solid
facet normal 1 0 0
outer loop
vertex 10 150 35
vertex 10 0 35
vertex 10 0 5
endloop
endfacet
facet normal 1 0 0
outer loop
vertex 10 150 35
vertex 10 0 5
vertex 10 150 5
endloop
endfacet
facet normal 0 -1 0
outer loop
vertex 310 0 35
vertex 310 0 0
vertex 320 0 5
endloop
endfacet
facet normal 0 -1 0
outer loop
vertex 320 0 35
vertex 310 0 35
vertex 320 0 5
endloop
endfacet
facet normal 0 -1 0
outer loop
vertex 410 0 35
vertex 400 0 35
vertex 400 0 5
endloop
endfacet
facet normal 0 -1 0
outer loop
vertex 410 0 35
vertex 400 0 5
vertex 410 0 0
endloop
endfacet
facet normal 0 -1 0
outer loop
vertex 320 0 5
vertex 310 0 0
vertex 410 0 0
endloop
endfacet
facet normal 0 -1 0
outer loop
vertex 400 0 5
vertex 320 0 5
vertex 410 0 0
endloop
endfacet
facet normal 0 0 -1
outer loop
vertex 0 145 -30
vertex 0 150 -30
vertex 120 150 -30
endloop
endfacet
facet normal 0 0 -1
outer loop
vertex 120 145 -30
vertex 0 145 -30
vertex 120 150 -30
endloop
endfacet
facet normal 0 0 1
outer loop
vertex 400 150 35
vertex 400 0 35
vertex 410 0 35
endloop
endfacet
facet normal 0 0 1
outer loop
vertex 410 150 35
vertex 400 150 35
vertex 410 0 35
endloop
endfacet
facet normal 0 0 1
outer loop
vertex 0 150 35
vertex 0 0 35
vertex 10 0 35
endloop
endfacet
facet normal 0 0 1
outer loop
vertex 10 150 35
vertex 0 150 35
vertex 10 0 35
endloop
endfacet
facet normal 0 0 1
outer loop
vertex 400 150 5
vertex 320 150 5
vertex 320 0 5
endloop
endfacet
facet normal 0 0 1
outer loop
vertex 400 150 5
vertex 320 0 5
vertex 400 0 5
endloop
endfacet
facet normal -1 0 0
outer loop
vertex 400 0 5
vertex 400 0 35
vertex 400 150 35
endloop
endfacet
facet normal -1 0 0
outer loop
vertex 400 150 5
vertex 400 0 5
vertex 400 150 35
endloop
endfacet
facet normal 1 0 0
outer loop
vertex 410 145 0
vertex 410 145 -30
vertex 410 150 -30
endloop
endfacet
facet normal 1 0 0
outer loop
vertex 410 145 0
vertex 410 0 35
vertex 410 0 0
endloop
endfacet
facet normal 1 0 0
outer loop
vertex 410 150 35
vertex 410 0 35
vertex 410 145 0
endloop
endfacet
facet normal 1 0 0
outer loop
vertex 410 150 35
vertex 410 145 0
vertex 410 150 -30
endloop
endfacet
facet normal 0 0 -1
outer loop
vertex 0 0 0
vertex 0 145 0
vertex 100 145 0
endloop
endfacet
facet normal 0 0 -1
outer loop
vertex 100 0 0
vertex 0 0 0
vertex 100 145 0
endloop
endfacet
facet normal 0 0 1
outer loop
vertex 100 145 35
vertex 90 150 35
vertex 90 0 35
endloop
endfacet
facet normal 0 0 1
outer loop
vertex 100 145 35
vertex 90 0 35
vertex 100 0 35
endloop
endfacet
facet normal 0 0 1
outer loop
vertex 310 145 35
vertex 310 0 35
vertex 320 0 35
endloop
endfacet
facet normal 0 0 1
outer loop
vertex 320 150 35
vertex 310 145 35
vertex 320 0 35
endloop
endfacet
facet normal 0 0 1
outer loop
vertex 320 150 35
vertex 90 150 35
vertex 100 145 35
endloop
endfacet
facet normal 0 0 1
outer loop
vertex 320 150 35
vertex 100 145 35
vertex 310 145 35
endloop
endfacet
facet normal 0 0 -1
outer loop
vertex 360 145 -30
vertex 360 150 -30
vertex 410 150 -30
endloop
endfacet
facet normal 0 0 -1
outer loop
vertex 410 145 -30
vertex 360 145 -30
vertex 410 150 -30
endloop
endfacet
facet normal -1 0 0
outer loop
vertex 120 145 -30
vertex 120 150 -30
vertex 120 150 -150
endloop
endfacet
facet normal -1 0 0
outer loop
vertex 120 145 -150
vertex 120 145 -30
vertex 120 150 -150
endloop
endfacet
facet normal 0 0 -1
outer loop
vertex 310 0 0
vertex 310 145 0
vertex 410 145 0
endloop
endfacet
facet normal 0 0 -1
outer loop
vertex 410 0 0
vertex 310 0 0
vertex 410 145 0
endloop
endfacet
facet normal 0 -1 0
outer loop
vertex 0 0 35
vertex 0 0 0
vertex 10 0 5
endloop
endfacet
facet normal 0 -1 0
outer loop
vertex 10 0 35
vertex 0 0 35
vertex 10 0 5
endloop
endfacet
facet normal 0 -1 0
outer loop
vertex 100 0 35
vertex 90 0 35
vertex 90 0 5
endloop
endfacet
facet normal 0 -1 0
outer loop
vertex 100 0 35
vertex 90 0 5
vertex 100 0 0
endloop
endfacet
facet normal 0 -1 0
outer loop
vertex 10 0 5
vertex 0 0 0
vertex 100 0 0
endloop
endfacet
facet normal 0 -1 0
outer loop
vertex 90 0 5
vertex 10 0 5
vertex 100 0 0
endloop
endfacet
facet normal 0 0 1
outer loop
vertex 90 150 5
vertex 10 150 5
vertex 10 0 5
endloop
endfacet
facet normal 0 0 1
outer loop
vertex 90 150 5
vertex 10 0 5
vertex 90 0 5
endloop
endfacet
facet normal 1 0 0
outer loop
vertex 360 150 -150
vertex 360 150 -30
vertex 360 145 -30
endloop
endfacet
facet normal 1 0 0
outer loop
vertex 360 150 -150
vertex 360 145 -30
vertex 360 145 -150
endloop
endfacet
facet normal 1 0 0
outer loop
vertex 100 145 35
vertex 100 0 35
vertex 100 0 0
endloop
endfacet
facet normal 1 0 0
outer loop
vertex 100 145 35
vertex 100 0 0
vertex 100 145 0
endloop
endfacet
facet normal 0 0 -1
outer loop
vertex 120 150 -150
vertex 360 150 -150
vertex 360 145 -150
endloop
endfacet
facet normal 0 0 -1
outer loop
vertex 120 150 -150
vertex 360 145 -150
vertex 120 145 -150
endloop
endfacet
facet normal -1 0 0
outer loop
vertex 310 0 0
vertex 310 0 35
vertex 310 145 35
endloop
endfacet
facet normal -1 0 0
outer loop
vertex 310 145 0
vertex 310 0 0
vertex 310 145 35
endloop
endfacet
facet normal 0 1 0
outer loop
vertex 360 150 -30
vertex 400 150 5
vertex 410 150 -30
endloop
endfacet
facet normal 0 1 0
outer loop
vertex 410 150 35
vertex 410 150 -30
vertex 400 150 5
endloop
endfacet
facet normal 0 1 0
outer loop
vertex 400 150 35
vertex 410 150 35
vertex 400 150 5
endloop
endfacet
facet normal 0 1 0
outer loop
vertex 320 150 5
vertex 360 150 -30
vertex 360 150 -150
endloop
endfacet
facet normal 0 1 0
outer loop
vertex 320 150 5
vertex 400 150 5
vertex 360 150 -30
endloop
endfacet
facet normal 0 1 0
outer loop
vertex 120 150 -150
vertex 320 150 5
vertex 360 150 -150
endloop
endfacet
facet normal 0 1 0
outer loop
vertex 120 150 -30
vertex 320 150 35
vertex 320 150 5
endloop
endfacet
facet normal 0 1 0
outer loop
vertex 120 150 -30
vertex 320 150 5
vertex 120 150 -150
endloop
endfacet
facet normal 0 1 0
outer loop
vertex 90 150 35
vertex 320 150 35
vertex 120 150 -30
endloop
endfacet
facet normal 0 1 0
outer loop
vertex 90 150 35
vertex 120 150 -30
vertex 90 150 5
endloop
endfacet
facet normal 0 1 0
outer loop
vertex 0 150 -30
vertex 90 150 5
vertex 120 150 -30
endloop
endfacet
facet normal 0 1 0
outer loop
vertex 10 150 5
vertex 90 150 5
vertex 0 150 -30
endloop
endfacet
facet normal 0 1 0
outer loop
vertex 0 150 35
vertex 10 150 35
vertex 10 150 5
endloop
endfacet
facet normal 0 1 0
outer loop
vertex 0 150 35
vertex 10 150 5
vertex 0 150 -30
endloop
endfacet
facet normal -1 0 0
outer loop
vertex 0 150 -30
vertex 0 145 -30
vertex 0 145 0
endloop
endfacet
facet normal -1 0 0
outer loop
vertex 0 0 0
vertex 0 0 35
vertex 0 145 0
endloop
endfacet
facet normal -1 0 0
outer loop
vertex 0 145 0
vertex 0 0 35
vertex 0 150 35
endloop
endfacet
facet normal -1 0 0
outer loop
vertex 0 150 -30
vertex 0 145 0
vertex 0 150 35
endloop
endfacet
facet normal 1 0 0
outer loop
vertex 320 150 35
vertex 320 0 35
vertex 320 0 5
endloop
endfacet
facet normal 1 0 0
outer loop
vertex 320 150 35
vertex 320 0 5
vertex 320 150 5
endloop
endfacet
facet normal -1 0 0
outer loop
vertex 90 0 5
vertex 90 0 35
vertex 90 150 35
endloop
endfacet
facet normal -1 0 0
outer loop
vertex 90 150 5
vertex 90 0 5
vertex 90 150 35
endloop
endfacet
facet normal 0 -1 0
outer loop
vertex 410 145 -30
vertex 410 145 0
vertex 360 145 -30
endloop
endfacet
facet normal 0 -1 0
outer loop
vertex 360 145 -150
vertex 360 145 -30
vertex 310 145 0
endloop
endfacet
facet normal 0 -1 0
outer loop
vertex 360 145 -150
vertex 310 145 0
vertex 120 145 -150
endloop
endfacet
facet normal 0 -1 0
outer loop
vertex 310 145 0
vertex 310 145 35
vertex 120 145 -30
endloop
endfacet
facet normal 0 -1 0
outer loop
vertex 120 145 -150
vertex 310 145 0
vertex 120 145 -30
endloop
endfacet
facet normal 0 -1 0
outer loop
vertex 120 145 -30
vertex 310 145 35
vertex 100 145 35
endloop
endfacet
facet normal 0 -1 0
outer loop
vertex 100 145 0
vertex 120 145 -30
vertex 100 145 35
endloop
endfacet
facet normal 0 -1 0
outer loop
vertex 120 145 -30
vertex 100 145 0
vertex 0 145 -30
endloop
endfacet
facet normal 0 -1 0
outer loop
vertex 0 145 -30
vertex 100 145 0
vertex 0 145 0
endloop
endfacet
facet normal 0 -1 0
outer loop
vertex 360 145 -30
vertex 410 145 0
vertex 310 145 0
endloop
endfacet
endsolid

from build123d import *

# Parameters (mm, degrees)
SKETCH1_W           = 410
SKETCH1_H           = 150
BOSS_EXTRUDE1_DEPTH = 35
SKETCH2_W           = 410
SKETCH2_H           = 5
BOSS_EXTRUDE2_DEPTH = 150
SKETCH3_W           = 80
SKETCH3_H           = 150
CUT_EXTRUDE1_DEPTH  = 30
SKETCH4_W           = 210
SKETCH4_H           = 145
CUT_EXTRUDE2_DEPTH  = 35
SKETCH5_W           = 120
SKETCH5_H           = 120
CUT_EXTRUDE3_DEPTH  = 10
SKETCH6_W           = 50
SKETCH6_H           = 120
CUT_EXTRUDE4_DEPTH  = 10


with BuildPart() as part:
    # Sketch1 → Boss-Extrude1 (new body)
    with BuildSketch(Plane.XY):
        with Locations((205, 75)):
            Rectangle(SKETCH1_W, SKETCH1_H)
    extrude(amount=BOSS_EXTRUDE1_DEPTH)

    # Sketch2 → Boss-Extrude2 (add)
    with BuildSketch(Plane(origin=(0, 0, 0), x_dir=(-1, 0, 0), z_dir=(0, 0, -1))):
        with Locations((-205, 147.5)):
            Rectangle(SKETCH2_W, SKETCH2_H)
    extrude(amount=BOSS_EXTRUDE2_DEPTH)

    # Sketch3 → Cut-Extrude1 (cut)
    with BuildSketch(Plane.XY.offset(35)):
        with Locations((50, 75)):
            Rectangle(SKETCH3_W, SKETCH3_H)
        with Locations((360, 75)):
            Rectangle(SKETCH3_W, SKETCH3_H)
    extrude(amount=-CUT_EXTRUDE1_DEPTH, mode=Mode.SUBTRACT)

    # Sketch4 → Cut-Extrude2 (cut)
    with BuildSketch(Plane.XY.offset(35)):
        with Locations((205, 72.5)):
            Rectangle(SKETCH4_W, SKETCH4_H)
    extrude(amount=-CUT_EXTRUDE2_DEPTH, mode=Mode.SUBTRACT)

    # Sketch5 → Cut-Extrude3 (cut)
    with BuildSketch(Plane(origin=(0, 150, 0), x_dir=(1, 0, 0), z_dir=(0, 1, 0))):
        with Locations((60, 90)):
            Rectangle(SKETCH5_W, SKETCH5_H)
    extrude(amount=-CUT_EXTRUDE3_DEPTH, mode=Mode.SUBTRACT)

    # Sketch6 → Cut-Extrude4 (cut)
    with BuildSketch(Plane(origin=(0, 150, 0), x_dir=(1, 0, 0), z_dir=(0, 1, 0))):
        with Locations((385, 90)):
            Rectangle(SKETCH6_W, SKETCH6_H)
    extrude(amount=-CUT_EXTRUDE4_DEPTH, mode=Mode.SUBTRACT)


solid = part.part
